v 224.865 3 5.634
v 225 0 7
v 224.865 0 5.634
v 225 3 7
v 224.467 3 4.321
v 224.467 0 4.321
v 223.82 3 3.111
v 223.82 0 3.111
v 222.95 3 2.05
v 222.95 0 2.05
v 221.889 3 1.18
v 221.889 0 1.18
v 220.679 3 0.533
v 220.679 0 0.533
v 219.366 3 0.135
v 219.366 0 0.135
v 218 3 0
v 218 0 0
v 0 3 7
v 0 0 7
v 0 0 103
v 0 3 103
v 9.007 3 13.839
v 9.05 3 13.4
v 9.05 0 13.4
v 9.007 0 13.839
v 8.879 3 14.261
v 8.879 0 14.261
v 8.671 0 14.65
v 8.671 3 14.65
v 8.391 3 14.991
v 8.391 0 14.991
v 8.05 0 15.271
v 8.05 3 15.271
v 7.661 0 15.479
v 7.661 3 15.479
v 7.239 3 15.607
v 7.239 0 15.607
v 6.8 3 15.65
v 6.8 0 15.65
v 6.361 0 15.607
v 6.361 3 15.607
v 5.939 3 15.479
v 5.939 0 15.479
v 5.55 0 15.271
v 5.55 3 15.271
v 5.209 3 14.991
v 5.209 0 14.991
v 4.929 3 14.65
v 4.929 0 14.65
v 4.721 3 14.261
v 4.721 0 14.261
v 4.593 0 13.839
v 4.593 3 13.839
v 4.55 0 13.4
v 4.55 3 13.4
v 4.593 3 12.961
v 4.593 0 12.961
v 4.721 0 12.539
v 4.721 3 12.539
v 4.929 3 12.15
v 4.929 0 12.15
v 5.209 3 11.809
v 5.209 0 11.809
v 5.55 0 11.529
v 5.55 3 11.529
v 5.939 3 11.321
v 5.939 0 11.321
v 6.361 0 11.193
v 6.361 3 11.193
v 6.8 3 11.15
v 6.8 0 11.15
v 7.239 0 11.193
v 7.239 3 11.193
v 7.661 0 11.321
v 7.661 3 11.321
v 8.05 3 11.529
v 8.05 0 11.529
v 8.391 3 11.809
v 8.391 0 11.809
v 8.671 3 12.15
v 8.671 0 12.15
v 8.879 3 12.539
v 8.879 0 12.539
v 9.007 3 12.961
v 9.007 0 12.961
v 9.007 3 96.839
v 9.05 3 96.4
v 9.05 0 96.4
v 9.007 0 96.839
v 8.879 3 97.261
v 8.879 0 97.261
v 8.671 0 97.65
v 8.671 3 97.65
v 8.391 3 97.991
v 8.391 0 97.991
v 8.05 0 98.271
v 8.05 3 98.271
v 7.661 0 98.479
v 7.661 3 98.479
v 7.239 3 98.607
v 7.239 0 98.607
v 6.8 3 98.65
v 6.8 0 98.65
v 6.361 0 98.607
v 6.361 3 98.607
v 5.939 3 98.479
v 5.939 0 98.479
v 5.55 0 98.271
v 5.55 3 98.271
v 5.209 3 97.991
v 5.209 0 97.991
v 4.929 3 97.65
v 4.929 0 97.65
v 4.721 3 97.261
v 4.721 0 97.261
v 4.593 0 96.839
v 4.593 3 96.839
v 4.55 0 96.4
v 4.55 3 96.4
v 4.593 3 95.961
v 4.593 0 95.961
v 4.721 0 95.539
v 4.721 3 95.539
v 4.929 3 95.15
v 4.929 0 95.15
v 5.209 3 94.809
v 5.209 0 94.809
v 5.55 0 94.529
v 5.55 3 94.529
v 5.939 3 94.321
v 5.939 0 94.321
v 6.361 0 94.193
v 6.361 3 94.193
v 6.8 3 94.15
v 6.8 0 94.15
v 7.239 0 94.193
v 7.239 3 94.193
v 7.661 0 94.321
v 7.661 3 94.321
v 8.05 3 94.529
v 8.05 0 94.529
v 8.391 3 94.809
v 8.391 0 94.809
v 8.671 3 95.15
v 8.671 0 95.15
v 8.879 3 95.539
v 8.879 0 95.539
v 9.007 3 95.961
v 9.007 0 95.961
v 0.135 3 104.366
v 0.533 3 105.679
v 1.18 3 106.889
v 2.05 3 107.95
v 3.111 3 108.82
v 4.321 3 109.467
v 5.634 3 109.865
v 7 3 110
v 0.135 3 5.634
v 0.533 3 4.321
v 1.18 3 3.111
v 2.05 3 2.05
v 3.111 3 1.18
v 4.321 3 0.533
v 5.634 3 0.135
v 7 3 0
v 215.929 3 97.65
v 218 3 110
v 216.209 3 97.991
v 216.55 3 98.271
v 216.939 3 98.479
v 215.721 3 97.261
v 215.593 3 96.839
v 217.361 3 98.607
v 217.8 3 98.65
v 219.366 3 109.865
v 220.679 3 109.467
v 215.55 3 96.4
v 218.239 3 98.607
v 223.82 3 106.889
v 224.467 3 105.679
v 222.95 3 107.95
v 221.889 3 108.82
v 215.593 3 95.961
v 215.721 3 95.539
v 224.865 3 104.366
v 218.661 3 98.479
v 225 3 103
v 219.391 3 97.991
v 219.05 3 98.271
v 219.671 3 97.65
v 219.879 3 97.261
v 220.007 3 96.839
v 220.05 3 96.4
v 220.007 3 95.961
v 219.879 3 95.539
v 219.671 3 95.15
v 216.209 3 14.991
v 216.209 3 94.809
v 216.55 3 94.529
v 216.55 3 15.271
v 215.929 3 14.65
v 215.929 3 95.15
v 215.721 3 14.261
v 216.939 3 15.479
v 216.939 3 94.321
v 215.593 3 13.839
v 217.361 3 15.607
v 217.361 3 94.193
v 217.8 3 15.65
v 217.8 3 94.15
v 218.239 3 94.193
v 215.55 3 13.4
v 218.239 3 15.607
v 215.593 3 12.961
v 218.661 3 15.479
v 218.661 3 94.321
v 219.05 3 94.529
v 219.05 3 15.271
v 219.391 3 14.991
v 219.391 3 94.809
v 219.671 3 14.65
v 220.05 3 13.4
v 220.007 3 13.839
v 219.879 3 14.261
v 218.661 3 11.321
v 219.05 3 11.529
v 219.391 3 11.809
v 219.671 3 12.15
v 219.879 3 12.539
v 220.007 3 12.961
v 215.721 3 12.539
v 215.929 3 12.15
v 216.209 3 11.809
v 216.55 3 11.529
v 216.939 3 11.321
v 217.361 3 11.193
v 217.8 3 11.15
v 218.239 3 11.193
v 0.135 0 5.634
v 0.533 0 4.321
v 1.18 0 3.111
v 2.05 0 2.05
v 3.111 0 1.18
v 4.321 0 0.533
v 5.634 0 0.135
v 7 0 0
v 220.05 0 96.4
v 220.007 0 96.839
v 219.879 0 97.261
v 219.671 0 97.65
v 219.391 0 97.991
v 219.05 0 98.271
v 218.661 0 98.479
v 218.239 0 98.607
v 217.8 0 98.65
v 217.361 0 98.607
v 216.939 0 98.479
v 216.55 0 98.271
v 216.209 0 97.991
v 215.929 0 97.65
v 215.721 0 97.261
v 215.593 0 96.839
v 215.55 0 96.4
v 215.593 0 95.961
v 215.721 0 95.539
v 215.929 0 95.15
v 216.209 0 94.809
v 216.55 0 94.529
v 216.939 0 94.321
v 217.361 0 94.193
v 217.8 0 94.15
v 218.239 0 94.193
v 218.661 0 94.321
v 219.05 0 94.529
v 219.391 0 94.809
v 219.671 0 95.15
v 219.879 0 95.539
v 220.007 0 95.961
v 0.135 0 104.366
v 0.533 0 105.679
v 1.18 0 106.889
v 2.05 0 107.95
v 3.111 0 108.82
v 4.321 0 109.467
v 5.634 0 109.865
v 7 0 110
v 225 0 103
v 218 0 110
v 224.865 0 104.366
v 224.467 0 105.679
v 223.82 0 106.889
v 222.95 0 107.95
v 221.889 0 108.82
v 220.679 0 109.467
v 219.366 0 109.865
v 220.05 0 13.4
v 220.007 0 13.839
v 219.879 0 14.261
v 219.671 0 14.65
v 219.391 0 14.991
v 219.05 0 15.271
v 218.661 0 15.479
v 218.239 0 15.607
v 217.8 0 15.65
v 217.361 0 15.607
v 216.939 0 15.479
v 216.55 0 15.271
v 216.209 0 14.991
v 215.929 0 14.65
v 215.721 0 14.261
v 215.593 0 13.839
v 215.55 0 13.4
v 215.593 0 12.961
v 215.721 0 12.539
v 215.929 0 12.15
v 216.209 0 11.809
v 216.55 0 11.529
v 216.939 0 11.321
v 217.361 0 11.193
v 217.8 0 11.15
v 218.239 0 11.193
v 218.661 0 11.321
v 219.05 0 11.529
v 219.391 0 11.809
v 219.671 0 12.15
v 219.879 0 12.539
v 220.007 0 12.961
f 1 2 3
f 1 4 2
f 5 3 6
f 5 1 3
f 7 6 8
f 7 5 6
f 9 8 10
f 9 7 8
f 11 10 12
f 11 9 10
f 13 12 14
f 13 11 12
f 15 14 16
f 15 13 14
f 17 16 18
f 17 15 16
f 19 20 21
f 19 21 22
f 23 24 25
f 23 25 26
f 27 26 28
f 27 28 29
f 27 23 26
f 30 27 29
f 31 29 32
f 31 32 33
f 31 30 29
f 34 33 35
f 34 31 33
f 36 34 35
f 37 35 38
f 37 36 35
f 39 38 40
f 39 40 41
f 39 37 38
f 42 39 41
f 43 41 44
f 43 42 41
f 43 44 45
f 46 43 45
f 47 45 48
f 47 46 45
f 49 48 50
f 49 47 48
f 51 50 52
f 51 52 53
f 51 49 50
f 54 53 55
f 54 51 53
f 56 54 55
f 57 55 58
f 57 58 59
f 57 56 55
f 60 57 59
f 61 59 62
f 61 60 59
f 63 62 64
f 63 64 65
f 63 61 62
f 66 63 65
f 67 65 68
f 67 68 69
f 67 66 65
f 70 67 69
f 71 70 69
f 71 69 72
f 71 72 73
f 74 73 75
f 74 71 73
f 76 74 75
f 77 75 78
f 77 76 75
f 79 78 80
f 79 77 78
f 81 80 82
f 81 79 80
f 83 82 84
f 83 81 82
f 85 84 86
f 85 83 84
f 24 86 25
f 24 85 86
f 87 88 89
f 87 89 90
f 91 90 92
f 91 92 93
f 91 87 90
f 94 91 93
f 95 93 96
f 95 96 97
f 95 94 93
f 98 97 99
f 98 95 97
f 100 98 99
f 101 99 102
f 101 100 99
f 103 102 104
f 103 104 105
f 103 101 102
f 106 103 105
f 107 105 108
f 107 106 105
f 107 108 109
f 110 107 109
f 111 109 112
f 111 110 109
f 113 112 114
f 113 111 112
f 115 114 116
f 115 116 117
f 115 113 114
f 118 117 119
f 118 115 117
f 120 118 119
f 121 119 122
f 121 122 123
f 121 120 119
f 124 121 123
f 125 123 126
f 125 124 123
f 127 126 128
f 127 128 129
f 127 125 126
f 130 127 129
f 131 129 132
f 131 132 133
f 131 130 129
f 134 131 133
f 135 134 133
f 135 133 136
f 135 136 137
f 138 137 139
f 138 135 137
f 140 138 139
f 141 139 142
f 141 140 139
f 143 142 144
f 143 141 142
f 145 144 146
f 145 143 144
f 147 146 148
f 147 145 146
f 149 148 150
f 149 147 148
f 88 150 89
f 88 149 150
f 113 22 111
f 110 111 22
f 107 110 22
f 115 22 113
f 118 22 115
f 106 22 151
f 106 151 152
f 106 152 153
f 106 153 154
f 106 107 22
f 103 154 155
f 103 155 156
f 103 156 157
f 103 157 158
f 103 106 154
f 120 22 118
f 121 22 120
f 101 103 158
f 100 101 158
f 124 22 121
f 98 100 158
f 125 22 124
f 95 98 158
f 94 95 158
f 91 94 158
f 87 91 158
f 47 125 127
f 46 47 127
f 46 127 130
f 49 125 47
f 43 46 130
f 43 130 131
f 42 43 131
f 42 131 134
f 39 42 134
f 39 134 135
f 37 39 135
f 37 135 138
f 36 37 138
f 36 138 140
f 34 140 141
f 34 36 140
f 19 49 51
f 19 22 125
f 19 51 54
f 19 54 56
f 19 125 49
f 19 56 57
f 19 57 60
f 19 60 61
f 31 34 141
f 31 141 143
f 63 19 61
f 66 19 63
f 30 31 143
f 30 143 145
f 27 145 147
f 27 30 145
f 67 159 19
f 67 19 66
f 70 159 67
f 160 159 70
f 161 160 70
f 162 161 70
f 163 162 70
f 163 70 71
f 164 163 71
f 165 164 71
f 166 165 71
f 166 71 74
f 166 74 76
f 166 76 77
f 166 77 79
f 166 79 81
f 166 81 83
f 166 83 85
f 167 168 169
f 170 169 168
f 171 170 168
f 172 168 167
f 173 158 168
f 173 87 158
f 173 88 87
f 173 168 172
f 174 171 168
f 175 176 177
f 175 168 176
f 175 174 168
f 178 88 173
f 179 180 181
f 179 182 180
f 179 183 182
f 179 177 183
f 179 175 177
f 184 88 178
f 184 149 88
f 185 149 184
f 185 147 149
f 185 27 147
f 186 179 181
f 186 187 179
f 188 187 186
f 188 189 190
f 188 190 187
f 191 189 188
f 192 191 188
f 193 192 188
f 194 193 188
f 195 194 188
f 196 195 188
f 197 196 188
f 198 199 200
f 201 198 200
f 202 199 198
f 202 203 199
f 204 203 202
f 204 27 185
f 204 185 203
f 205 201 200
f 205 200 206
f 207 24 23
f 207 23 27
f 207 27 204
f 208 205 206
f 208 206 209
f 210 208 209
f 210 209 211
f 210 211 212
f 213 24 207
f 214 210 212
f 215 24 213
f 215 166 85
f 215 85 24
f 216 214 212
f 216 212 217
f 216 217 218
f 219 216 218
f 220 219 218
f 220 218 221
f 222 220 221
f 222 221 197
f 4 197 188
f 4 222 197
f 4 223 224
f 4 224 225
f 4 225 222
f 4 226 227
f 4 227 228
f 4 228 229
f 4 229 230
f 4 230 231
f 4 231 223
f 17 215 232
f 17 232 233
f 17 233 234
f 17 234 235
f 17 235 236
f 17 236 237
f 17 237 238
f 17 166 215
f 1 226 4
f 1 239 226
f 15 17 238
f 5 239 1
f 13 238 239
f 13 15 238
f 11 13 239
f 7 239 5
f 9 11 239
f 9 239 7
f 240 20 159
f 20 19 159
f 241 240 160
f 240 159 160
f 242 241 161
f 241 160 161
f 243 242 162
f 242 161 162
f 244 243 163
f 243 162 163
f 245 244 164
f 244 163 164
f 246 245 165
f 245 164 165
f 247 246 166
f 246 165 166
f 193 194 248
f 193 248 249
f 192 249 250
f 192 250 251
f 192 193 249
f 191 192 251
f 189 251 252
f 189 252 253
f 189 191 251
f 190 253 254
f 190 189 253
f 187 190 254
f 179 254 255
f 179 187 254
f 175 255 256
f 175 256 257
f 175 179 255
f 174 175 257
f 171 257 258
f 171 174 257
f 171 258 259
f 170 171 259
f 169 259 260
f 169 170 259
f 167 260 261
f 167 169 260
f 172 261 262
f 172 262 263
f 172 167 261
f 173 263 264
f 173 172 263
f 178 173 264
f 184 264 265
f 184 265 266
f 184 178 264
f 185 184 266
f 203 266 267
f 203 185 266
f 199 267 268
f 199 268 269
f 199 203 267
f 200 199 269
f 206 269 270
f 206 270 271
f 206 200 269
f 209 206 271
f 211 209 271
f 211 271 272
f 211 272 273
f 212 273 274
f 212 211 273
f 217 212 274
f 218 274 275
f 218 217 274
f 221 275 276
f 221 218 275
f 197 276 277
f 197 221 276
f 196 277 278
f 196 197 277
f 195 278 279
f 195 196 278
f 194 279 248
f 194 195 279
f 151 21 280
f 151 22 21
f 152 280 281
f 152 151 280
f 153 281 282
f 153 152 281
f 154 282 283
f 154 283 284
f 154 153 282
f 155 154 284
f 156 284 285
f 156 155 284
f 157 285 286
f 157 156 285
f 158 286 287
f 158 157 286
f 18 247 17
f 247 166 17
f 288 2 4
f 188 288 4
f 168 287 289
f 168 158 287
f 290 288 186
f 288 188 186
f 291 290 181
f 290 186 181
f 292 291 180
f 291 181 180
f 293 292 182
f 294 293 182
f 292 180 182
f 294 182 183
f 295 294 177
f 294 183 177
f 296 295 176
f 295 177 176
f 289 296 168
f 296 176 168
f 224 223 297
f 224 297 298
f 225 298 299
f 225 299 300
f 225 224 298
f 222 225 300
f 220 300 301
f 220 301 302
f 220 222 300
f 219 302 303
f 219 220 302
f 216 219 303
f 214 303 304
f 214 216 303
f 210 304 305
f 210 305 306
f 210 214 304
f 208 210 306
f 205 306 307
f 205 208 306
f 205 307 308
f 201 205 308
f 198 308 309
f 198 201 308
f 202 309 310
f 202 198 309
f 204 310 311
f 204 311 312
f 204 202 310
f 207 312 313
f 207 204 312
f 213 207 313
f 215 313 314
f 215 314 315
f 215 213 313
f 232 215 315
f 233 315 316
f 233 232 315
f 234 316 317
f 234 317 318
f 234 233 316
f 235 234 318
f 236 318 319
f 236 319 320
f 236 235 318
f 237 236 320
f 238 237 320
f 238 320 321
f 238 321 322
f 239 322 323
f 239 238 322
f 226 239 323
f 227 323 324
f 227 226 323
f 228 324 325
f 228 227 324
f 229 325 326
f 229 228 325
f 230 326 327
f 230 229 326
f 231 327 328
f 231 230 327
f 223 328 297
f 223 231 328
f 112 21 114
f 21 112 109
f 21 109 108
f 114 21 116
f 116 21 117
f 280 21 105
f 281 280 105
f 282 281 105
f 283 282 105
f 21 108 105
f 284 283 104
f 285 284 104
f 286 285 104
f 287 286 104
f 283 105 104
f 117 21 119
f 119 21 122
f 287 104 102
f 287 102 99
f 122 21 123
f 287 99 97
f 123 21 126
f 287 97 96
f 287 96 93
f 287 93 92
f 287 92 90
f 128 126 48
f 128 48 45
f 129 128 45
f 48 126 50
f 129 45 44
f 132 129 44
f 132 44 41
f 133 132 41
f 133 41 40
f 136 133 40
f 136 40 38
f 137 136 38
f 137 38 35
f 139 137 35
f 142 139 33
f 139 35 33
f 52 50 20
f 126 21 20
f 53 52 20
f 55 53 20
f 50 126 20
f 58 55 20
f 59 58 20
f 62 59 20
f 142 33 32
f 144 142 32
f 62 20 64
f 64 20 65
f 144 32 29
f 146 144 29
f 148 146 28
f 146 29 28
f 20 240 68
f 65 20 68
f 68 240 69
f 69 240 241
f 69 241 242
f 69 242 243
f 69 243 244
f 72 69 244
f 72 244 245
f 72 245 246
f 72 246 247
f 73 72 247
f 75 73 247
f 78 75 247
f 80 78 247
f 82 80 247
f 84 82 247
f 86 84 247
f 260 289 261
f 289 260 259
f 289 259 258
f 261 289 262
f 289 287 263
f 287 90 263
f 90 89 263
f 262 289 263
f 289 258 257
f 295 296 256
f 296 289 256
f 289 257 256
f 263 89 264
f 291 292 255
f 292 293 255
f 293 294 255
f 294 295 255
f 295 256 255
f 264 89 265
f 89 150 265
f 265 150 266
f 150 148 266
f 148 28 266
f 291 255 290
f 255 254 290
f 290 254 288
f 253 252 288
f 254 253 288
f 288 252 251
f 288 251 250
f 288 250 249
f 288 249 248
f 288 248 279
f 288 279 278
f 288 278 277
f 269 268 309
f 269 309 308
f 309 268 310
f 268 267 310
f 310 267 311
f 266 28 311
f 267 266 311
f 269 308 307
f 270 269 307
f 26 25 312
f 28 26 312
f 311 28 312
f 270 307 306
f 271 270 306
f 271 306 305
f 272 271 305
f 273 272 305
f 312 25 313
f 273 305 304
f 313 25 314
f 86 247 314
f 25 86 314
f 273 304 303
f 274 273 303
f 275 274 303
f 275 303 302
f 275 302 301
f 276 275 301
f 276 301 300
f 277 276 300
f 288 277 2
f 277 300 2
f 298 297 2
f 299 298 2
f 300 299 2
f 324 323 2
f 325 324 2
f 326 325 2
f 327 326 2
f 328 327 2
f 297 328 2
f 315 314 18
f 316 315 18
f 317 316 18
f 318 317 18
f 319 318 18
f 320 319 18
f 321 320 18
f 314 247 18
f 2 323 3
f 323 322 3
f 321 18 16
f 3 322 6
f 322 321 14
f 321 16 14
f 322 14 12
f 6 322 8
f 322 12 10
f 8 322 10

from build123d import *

# Parameters (mm, degrees)
CYLINDER007_R     = 2.25
CYLINDER007_DEPTH = 3
CYLINDER006_R     = 2.25
CYLINDER006_DEPTH = 3
CYLINDER005_R     = 2.25
CYLINDER005_DEPTH = 3
CYLINDER_R        = 2.25
CYLINDER_DEPTH    = 3
BOX_W             = 225
BOX_H             = 3
BOX_DEPTH         = 110
FILLET_R          = 7


with BuildPart() as cylinder007:
    # Cylinder007 → Cylinder007 (new body)
    with BuildSketch(Plane(origin=(217.8, -18, 13.4), x_dir=(1, 0, 0), z_dir=(0, -1, 0))):
        Circle(CYLINDER007_R)
    extrude(amount=CYLINDER007_DEPTH)


with BuildPart() as fusion005:
    # Cylinder006 → Cylinder006 (new body)
    with BuildSketch(Plane(origin=(217.8, -18, 96.4), x_dir=(1, 0, 0), z_dir=(0, -1, 0))):
        Circle(CYLINDER006_R)
    extrude(amount=CYLINDER006_DEPTH)

    # Fusion005: union Cylinder007
    add(cylinder007.part)


with BuildPart() as cylinder005:
    # Cylinder005 → Cylinder005 (new body)
    with BuildSketch(Plane(origin=(6.8, -18, 96.4), x_dir=(1, 0, 0), z_dir=(0, -1, 0))):
        Circle(CYLINDER005_R)
    extrude(amount=CYLINDER005_DEPTH)


with BuildPart() as screw_holes:
    # Cylinder → Cylinder (new body)
    with BuildSketch(Plane(origin=(6.8, -18, 13.4), x_dir=(1, 0, 0), z_dir=(0, -1, 0))):
        Circle(CYLINDER_R)
    extrude(amount=CYLINDER_DEPTH)

    # Fusion004: union Cylinder005
    add(cylinder005.part)

    # Fusion006: union Fusion005
    add(fusion005.part)


with BuildPart() as screw_holes_1:
    # Fusion006 placement: moved
    add(screw_holes.part.moved(Location((0, 21, 0))))


with BuildPart() as cut009:
    # Box → Box (new body)
    with BuildSketch(Plane.XY):
        with Locations((112.5, 1.5)):
            Rectangle(BOX_W, BOX_H)
    extrude(amount=BOX_DEPTH)

    # Fillet
    fillet_edges = [cut009.edges().sort_by_distance(p)[0] for p in [
        (0, 1.5, 110),
        (0, 1.5, 0),
        (225, 1.5, 110),
        (225, 1.5, 0),
    ]]
    fillet(fillet_edges, radius=FILLET_R)

    # Cut009: cut Screw Holes
    add(screw_holes_1.part, mode=Mode.SUBTRACT)


solid = cut009.part
